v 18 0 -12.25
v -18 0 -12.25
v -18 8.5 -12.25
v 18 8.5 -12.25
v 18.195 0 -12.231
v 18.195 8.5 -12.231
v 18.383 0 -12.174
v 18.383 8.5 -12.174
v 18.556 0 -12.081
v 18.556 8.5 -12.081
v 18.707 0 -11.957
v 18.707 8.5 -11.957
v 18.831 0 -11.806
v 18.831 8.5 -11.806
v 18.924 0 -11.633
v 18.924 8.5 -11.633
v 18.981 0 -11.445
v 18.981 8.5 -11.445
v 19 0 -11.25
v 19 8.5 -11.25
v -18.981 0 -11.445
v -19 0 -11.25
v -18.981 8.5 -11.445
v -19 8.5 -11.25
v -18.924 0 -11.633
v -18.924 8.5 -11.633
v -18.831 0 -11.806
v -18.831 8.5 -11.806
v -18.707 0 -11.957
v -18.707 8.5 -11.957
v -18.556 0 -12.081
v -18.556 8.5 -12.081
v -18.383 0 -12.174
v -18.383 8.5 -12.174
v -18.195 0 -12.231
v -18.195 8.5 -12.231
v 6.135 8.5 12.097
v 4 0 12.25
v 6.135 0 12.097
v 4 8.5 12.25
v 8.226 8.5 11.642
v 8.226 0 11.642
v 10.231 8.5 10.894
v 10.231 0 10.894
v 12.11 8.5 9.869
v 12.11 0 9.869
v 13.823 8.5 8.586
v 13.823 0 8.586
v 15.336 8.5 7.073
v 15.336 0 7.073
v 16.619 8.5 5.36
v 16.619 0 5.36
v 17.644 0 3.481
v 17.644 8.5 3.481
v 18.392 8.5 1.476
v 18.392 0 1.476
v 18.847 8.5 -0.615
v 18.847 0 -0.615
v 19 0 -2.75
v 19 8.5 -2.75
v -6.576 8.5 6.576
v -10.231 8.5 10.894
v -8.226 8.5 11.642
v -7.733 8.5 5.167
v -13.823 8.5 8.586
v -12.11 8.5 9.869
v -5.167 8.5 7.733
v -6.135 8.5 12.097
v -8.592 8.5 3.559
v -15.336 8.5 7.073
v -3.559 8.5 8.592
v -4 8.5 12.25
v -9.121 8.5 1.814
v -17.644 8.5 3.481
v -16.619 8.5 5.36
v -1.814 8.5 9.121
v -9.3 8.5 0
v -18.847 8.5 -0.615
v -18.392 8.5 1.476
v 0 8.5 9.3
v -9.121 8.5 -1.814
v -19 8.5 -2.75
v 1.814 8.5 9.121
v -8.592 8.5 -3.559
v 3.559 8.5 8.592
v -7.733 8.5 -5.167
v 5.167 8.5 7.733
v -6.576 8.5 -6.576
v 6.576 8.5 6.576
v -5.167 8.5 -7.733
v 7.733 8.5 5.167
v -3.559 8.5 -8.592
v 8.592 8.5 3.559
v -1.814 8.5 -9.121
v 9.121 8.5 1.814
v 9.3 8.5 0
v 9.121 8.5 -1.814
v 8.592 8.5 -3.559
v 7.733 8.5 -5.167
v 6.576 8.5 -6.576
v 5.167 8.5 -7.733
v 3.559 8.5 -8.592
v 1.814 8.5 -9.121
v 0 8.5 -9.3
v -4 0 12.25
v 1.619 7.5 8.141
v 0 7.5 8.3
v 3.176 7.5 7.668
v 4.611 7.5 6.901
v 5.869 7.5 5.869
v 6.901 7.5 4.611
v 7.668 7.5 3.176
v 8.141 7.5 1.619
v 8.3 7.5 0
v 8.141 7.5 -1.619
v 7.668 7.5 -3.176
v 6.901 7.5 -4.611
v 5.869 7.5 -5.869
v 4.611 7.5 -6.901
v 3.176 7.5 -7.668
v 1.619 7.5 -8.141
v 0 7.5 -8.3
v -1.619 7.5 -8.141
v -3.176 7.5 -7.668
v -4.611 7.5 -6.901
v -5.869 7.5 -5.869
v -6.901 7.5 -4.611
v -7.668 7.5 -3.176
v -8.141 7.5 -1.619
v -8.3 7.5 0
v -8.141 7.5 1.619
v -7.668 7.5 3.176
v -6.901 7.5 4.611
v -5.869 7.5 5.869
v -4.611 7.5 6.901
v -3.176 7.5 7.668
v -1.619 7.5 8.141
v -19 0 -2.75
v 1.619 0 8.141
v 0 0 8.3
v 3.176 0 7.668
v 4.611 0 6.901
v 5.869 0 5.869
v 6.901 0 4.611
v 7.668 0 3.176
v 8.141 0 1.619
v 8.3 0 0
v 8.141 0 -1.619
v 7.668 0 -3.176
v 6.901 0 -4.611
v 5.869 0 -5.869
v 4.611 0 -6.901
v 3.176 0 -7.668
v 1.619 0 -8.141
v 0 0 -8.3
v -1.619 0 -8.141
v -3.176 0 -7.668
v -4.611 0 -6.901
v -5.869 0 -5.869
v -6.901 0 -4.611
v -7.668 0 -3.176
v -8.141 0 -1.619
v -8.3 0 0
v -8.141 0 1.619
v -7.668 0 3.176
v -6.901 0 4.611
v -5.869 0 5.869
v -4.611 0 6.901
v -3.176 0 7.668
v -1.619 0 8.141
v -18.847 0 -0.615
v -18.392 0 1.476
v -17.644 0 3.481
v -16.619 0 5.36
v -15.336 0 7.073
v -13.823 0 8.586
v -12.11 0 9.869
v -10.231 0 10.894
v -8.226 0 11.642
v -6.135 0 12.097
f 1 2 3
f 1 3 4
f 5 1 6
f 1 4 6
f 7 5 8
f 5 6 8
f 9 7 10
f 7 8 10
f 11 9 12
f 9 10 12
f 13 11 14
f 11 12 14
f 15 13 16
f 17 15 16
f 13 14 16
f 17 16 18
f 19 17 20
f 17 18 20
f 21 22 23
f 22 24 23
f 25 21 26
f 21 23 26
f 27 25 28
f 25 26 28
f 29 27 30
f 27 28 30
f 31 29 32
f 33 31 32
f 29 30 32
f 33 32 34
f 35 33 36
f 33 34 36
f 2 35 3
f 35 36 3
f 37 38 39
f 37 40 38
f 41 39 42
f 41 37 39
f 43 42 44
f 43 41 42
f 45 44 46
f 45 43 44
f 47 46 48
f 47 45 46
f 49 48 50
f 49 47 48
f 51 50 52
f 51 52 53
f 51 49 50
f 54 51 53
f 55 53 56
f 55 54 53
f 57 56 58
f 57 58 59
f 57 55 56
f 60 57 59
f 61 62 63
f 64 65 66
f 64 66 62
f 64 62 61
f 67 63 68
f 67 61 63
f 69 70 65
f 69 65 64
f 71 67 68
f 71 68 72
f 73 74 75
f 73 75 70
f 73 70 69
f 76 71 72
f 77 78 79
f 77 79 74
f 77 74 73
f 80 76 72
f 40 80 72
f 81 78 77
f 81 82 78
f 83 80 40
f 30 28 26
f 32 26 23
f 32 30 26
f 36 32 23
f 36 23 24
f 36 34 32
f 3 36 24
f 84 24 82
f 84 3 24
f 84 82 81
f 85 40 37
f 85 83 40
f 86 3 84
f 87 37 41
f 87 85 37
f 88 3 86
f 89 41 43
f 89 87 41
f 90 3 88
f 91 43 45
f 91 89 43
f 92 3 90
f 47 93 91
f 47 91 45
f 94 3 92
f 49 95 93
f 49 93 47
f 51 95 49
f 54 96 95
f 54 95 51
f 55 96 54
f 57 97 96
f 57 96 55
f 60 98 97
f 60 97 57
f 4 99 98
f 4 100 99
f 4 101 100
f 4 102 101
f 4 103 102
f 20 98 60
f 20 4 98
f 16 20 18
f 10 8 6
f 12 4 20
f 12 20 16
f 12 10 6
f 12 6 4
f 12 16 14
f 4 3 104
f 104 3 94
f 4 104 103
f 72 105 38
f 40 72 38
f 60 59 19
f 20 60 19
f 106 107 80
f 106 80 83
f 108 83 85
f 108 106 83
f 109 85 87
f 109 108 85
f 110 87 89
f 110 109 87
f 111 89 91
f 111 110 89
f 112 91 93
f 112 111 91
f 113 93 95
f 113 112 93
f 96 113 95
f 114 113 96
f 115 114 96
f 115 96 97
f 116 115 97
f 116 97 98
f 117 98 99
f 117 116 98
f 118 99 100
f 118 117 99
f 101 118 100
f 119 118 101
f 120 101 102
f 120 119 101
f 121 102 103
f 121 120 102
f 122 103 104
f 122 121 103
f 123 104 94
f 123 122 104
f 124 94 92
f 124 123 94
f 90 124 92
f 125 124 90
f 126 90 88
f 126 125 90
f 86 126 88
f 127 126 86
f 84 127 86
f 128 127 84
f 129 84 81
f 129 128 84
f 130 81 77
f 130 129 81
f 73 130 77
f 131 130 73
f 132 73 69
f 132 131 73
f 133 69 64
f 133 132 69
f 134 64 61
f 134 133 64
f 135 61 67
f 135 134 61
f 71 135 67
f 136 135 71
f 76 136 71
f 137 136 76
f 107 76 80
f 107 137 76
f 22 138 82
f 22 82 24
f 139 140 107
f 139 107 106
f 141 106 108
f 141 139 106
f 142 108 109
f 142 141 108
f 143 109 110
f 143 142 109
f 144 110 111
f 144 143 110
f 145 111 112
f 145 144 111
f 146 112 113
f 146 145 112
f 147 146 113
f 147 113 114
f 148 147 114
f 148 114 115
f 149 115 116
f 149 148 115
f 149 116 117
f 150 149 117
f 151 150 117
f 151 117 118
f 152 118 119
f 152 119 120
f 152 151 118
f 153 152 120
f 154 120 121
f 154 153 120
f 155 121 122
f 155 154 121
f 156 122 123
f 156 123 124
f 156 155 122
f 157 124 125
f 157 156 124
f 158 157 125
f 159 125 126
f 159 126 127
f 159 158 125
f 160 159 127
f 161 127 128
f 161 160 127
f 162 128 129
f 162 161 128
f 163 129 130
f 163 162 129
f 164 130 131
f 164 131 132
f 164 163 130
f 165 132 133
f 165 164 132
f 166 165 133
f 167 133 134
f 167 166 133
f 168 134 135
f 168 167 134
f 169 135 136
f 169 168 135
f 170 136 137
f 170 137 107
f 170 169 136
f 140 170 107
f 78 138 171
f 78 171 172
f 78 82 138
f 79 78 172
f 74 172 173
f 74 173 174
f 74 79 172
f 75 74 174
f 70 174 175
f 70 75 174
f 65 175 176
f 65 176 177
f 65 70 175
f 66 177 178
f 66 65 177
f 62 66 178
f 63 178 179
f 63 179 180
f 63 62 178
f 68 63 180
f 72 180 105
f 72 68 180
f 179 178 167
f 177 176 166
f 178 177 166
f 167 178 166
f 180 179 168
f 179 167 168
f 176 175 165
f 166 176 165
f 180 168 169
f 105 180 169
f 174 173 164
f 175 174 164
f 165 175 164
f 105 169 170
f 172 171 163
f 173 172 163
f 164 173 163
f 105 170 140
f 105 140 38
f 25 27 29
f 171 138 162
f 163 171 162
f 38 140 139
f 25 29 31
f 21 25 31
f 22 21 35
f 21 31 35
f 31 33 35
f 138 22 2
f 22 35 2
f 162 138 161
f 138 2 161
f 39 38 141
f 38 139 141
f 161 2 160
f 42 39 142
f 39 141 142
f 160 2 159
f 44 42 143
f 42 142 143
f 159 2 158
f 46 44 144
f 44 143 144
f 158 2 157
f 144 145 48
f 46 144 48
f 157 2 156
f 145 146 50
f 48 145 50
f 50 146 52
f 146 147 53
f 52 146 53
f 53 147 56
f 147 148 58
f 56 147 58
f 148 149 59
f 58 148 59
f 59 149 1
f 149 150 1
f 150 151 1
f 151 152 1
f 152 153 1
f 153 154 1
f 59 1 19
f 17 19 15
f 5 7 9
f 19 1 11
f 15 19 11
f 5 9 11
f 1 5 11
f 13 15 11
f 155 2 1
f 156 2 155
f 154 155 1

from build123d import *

# Parameters (mm, degrees)
SKETCH1_W           = 38
SKETCH1_H           = 24.5
SKETCH1_R           = 8.3
BOSS_EXTRUDE1_DEPTH = 8.5
FILLET1_R           = 15
FILLET2_R           = 1
CHAMFER1_SIZE       = 1


with BuildPart() as part:
    # Sketch1 → Boss-Extrude1 (new body)
    with BuildSketch(Plane(origin=(0, 0, 0), x_dir=(1, 0, 0), z_dir=(0, 1, 0))):
        Rectangle(SKETCH1_W, SKETCH1_H)
        with Locations(Location((0, 0, 0), (0, 0, 270))):
            Circle(SKETCH1_R, mode=Mode.SUBTRACT)
    extrude(amount=BOSS_EXTRUDE1_DEPTH)

    # Fillet1
    fillet1_edges = [part.edges().sort_by_distance(p)[0] for p in [
        (19, 4.25, 12.25),
        (-19, 4.25, 12.25),
    ]]
    fillet(fillet1_edges, radius=FILLET1_R)

    # Fillet2
    fillet2_edges = [part.edges().sort_by_distance(p)[0] for p in [
        (-19, 4.25, -12.25),
        (19, 4.25, -12.25),
    ]]
    fillet(fillet2_edges, radius=FILLET2_R)

    # Chamfer1
    chamfer1_edges = [part.edges().sort_by_distance(p)[0] for p in [
        (0, 8.5, -8.3),
    ]]
    chamfer(chamfer1_edges, length=CHAMFER1_SIZE)


solid = part.part
